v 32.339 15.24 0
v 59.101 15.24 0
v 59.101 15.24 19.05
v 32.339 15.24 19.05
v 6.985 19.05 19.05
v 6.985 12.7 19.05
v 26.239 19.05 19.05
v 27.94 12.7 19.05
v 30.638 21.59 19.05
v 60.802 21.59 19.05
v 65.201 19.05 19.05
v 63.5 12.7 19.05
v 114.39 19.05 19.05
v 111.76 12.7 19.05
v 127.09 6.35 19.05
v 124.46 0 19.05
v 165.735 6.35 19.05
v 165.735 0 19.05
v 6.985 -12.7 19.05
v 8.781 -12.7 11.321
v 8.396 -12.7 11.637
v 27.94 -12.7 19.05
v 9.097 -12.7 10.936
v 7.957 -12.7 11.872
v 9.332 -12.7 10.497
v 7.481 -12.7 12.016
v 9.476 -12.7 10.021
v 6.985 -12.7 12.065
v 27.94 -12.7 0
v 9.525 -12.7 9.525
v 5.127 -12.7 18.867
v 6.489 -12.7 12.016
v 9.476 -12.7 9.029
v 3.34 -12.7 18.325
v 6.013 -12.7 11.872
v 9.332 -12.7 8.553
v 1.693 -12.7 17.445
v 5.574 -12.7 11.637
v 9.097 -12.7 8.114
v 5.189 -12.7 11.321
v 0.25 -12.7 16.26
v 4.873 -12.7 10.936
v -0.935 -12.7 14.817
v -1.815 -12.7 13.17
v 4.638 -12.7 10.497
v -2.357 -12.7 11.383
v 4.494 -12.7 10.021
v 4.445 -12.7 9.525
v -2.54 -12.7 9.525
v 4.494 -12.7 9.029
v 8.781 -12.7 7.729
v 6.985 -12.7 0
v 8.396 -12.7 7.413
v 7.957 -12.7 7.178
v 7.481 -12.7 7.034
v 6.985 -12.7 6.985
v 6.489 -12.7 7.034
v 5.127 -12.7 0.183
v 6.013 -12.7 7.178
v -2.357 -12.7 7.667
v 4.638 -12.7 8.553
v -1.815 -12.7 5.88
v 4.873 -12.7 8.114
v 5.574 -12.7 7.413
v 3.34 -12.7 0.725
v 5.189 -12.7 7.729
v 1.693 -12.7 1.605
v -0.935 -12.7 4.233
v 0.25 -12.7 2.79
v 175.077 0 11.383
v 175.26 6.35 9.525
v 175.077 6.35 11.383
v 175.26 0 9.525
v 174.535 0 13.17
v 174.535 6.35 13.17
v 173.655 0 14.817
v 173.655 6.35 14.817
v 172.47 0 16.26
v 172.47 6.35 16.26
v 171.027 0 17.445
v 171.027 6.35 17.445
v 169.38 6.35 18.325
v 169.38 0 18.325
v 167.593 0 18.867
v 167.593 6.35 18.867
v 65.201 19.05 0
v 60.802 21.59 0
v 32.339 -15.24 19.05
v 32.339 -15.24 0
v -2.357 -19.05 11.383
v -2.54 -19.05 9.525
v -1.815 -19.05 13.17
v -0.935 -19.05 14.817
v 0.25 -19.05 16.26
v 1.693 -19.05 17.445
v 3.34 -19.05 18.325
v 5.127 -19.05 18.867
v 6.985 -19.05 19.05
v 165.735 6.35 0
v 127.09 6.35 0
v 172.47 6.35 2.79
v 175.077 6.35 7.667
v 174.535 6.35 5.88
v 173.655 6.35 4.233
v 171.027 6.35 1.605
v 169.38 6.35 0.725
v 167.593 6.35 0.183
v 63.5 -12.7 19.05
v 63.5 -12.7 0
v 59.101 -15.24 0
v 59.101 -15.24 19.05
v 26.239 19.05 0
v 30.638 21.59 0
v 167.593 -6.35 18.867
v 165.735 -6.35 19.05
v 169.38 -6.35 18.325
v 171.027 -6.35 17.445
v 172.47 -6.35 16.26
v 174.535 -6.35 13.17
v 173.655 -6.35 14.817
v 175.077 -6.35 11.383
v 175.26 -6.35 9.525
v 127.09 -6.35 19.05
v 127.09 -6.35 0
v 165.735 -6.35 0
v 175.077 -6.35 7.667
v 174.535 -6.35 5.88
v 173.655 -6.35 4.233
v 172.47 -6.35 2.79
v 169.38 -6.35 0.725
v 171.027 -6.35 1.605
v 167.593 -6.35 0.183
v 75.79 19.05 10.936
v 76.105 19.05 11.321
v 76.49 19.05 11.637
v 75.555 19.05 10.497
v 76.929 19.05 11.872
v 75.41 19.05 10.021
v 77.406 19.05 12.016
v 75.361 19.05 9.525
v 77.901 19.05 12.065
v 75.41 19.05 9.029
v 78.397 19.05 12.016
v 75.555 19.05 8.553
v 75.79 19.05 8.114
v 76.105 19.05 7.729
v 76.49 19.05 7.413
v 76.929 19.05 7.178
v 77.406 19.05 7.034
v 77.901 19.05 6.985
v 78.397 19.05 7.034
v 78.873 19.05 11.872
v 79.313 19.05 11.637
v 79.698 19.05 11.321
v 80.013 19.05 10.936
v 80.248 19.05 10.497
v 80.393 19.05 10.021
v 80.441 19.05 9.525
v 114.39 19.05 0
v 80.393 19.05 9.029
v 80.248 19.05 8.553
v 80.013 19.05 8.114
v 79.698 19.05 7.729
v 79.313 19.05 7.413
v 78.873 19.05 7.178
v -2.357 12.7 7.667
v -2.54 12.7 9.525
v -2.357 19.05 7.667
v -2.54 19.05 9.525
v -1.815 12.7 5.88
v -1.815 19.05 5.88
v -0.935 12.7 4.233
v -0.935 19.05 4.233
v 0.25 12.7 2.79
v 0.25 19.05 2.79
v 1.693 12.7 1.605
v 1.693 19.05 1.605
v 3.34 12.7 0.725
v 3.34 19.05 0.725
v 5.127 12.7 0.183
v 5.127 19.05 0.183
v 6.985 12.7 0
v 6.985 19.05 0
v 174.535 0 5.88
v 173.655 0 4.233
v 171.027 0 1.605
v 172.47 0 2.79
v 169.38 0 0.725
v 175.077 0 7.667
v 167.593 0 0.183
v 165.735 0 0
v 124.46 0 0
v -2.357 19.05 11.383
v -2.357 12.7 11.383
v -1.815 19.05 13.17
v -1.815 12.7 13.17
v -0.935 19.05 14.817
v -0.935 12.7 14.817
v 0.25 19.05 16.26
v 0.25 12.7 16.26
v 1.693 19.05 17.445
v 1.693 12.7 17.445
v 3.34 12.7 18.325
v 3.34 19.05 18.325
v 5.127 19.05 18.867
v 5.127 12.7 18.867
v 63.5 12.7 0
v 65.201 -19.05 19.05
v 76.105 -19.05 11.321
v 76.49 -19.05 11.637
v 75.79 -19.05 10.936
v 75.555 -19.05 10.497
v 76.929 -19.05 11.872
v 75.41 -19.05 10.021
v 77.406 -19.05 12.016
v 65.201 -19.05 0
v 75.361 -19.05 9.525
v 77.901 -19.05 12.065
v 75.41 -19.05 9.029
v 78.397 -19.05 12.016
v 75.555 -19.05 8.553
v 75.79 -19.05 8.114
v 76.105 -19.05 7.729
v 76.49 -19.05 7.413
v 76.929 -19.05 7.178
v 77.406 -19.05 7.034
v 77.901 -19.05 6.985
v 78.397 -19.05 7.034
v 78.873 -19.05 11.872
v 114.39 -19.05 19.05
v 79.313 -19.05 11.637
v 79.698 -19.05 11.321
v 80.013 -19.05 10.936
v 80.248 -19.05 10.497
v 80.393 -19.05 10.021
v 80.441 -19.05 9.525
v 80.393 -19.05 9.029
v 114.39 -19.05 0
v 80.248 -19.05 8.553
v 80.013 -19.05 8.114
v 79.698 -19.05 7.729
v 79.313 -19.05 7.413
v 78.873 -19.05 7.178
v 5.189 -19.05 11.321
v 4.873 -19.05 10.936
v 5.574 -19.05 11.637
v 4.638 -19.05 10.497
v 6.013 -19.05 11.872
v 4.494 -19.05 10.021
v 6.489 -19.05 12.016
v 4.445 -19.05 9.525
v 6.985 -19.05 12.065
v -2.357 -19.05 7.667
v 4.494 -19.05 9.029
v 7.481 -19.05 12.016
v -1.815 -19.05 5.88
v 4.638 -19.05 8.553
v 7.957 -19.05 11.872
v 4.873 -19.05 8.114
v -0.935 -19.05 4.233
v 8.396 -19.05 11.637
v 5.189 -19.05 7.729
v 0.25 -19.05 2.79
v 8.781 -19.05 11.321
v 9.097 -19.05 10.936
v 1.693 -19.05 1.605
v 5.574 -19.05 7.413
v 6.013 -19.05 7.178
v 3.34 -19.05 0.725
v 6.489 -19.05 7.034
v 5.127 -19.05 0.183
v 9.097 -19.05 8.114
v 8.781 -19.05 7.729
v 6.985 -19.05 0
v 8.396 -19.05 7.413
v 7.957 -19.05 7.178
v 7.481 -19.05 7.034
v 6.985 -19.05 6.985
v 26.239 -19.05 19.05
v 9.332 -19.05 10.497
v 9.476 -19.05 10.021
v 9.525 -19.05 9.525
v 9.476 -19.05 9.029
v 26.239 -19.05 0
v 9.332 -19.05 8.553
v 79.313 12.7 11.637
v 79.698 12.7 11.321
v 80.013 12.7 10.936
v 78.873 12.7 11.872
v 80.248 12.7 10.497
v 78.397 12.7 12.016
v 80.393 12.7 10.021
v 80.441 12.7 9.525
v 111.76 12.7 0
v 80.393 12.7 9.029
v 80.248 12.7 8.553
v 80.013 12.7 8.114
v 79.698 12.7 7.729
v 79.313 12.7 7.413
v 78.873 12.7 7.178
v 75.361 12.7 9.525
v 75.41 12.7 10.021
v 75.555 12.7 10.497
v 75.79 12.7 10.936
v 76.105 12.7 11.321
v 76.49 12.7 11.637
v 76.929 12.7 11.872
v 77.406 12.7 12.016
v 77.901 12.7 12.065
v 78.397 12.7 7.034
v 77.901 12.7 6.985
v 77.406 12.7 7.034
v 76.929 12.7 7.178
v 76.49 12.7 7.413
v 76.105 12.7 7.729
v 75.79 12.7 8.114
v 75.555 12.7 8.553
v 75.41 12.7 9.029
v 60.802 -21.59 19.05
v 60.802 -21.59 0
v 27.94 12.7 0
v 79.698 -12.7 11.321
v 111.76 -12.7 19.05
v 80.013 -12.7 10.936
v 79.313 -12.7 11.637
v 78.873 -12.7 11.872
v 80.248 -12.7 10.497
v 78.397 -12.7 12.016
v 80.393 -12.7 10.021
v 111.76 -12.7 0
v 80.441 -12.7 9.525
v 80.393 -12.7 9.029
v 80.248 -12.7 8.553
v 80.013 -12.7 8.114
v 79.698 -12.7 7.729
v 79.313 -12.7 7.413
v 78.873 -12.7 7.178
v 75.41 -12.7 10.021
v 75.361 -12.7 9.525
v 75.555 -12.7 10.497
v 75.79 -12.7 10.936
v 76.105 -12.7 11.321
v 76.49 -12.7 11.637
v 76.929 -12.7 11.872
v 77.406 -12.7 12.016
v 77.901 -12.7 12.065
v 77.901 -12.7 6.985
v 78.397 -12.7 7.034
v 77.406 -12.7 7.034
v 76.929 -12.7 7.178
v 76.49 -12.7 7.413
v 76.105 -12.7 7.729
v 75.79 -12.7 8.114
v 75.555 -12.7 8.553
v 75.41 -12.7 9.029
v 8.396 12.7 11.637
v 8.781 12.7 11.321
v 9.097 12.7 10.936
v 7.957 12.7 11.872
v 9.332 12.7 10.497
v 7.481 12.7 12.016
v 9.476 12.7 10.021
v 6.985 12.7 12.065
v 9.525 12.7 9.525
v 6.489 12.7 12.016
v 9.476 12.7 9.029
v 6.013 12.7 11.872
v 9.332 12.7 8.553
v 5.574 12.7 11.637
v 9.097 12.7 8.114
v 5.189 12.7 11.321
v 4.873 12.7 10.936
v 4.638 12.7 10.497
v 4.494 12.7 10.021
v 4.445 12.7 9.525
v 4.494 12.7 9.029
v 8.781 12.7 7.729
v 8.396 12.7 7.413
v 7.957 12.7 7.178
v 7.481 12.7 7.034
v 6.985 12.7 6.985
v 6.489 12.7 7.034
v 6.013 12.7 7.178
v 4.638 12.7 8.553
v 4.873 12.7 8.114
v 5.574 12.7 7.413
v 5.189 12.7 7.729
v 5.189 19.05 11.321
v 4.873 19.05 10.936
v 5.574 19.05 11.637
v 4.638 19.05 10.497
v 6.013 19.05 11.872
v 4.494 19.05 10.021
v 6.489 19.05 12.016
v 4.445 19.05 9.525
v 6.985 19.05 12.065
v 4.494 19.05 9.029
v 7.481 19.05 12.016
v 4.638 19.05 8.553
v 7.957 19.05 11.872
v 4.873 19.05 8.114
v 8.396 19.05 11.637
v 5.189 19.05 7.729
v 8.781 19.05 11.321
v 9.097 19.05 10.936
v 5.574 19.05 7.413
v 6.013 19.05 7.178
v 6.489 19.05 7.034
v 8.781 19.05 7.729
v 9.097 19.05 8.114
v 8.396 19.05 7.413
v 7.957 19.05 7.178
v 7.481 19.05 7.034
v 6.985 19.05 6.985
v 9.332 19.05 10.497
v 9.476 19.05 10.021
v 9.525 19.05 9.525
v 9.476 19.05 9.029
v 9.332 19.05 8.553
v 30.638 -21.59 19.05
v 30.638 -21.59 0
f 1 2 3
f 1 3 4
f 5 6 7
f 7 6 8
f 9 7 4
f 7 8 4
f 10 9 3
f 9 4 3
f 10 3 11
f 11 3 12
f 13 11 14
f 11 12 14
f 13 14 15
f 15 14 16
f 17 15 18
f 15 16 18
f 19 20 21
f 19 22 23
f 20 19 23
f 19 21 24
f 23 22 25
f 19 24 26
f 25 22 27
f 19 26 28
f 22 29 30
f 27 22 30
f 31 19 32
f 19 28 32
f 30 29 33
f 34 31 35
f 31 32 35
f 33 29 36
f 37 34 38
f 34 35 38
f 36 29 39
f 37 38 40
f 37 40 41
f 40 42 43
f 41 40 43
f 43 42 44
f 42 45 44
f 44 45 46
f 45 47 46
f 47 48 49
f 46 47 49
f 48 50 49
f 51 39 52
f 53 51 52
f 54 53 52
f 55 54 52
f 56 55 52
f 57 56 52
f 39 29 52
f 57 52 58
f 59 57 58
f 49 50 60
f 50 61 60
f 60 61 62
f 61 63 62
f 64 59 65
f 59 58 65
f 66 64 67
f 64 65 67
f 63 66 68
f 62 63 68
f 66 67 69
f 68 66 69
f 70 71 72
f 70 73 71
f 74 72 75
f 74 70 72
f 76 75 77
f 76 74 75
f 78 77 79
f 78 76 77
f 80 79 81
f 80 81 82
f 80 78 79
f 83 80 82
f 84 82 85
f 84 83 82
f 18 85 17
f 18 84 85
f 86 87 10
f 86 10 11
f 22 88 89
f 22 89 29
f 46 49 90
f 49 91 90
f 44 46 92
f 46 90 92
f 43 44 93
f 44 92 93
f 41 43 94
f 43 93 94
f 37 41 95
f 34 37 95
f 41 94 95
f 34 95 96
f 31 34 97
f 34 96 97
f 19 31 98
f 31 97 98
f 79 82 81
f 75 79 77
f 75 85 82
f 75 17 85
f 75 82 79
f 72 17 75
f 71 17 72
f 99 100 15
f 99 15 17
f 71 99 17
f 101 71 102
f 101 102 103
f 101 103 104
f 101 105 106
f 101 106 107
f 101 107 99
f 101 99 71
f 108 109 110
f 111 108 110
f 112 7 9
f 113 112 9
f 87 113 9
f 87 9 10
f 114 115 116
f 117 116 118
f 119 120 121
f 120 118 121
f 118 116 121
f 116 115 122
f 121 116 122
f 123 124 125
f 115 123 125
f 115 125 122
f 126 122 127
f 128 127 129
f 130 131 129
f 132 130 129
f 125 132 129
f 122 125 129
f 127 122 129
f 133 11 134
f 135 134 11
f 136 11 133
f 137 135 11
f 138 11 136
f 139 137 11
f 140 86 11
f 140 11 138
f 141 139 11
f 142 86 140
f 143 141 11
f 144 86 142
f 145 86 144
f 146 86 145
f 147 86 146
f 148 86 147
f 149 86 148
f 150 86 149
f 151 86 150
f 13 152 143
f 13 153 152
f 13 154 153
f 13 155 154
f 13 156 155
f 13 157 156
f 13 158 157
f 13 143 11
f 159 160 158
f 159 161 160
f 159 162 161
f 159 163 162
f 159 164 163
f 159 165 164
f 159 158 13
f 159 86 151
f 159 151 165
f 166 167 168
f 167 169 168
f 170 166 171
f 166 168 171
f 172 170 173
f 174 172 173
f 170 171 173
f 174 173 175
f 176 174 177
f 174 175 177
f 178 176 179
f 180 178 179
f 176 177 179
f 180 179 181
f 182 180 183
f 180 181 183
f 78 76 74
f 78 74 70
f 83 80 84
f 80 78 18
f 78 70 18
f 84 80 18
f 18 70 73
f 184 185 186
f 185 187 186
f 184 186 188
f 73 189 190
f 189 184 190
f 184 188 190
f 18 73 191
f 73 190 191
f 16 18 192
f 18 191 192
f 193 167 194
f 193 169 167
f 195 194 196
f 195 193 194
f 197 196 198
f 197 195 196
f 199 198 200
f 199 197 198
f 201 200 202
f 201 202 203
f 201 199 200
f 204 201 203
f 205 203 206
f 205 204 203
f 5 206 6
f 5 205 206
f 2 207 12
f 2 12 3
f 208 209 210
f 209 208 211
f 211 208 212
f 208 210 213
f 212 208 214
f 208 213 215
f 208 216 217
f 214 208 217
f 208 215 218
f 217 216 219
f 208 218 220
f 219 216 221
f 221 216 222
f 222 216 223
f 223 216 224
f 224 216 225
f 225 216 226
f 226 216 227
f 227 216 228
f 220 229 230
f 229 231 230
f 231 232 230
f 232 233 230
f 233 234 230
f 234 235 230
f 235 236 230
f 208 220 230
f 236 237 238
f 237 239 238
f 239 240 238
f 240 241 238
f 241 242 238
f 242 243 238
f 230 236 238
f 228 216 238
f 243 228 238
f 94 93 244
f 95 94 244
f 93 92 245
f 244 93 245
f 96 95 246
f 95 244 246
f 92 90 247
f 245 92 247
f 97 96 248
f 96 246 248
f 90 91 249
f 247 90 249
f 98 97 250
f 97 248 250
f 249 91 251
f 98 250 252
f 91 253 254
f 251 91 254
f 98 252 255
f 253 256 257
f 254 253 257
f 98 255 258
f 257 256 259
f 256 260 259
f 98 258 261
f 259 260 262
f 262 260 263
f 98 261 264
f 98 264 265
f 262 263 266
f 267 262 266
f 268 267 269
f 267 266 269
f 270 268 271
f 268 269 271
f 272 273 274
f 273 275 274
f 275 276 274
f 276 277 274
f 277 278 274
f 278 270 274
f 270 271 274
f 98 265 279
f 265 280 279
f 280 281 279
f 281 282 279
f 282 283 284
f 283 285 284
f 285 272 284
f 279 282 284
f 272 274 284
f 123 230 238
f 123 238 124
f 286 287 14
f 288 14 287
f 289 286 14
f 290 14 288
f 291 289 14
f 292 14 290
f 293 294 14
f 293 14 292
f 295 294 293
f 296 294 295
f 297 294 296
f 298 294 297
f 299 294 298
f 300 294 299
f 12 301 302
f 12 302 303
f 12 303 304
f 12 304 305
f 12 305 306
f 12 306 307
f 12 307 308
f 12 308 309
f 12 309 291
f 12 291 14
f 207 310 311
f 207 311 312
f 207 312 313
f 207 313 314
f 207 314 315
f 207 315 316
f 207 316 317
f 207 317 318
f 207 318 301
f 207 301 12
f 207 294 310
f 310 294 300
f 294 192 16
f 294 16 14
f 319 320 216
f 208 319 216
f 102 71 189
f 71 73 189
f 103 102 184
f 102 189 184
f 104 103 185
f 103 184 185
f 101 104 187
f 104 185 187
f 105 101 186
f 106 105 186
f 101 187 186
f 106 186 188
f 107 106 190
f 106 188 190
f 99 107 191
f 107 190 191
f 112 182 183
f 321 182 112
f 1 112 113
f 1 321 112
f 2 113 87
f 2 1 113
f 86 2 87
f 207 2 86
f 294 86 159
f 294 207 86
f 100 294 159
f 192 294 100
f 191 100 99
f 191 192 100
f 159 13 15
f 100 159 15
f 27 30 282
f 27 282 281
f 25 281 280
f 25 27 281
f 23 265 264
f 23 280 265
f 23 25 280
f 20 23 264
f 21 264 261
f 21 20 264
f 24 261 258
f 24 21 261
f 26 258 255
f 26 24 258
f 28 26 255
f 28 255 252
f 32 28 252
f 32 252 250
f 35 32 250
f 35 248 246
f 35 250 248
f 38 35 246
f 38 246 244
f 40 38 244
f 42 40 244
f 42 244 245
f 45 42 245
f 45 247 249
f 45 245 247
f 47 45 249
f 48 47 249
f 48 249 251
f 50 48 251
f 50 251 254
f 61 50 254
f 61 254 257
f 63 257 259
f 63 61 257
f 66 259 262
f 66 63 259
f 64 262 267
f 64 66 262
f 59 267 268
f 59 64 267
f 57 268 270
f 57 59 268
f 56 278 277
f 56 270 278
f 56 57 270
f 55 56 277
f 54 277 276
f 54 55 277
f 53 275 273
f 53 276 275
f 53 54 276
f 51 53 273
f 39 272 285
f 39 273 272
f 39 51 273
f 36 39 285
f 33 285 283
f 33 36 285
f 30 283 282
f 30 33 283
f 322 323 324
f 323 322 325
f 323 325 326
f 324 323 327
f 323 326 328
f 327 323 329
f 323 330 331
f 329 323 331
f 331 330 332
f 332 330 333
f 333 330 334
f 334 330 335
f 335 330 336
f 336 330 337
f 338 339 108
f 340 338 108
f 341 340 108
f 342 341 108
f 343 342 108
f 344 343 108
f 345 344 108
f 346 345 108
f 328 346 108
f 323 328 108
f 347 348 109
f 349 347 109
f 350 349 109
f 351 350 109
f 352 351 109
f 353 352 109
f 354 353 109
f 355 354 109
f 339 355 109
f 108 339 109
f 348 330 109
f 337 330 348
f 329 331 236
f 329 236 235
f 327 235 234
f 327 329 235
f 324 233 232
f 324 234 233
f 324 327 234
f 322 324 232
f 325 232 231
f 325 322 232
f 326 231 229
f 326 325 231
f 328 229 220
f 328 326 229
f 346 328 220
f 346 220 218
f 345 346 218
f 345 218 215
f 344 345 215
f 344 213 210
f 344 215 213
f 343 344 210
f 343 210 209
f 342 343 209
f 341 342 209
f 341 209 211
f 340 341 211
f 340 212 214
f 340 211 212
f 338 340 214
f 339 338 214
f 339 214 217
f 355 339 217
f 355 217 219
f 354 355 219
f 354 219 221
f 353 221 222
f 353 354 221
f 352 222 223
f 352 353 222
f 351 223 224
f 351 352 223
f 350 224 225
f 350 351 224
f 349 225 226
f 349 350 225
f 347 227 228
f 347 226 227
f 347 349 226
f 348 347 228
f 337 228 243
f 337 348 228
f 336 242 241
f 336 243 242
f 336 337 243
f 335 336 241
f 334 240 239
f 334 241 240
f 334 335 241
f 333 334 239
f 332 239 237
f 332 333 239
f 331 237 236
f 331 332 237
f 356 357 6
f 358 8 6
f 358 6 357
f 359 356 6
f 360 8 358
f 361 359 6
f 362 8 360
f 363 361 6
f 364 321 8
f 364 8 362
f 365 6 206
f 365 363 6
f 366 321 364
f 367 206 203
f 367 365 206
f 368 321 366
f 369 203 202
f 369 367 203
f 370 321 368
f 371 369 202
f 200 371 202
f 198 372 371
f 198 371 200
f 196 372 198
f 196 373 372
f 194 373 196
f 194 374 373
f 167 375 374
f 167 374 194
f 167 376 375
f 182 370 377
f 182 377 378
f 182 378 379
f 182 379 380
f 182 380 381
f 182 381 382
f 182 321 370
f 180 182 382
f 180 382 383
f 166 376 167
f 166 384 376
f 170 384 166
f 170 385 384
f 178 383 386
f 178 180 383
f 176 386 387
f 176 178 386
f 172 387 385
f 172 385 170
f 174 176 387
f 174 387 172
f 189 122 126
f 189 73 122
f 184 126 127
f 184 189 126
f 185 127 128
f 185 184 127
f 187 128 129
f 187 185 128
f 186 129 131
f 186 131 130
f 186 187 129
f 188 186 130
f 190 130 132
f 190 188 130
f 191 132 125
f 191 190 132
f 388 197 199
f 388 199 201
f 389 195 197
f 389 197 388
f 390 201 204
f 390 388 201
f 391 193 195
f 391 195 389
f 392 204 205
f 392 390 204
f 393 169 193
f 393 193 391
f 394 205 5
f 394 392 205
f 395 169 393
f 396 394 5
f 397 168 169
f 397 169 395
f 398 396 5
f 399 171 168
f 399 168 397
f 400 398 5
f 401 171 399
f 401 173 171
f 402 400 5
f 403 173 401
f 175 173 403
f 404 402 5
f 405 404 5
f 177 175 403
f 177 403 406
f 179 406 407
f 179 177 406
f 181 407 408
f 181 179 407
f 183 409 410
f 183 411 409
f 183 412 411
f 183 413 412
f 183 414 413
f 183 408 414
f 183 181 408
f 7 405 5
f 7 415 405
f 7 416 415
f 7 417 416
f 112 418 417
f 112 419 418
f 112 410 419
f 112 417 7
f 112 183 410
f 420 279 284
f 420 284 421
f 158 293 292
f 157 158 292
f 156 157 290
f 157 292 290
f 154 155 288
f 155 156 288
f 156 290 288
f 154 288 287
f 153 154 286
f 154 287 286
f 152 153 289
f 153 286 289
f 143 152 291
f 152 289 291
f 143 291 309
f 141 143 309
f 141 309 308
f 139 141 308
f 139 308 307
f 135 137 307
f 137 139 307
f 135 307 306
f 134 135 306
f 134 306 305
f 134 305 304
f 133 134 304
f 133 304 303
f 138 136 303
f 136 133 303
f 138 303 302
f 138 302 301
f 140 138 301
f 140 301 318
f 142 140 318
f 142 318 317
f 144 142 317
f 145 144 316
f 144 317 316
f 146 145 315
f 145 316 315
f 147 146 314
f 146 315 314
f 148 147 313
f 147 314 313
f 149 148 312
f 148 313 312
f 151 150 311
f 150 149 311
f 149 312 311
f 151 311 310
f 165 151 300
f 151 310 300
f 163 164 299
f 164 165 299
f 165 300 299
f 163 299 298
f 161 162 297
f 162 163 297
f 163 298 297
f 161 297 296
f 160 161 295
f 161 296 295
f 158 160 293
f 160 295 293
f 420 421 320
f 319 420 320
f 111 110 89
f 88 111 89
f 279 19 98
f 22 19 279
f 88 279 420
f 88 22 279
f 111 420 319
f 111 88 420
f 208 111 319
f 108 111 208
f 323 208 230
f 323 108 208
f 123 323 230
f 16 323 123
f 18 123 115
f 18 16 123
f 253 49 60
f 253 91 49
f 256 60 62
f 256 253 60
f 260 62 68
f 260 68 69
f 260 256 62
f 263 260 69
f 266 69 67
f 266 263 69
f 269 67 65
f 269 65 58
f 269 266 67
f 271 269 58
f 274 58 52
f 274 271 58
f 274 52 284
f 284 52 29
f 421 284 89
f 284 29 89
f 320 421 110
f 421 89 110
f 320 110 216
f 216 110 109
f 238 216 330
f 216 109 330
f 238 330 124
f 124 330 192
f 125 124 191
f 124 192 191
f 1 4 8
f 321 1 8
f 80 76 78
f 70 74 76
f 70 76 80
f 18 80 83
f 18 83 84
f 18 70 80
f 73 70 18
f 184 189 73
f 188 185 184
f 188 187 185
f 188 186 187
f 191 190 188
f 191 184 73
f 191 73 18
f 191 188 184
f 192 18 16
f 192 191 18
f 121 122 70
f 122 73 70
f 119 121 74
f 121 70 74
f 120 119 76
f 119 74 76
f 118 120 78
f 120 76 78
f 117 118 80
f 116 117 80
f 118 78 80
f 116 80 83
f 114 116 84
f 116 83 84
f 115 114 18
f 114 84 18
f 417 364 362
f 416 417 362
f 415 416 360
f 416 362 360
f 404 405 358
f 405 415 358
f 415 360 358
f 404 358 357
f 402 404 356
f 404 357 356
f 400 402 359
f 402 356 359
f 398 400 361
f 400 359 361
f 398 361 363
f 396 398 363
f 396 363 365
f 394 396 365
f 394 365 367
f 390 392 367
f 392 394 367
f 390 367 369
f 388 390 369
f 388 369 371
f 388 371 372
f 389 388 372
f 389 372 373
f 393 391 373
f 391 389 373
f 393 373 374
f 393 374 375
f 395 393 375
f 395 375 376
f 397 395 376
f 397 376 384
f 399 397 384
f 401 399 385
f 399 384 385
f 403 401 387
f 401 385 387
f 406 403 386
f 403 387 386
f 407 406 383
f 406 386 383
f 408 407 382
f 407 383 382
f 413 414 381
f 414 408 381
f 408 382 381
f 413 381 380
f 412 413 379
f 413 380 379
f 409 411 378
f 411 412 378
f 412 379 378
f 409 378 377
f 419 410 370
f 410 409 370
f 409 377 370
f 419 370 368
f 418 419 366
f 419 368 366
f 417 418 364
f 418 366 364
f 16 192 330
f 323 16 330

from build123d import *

# Parameters (mm, degrees)
F1_DEPTH = 19.05
F2_R     = 9.52499
F3_R     = 2.54
F4_DEPTH = 25.4


# Not quite as in the source:
# - a fillet or chamfer is up to 0.001 mm smaller than in the source, because OpenCascade refuses the exact size


with BuildPart() as f1:
    # F0 (on Top) → F1 (new body)
    with BuildSketch(Plane.XY):
        Polygon((27.94, -12.7), (-2.54, -12.7), (-2.54, -19.05), (26.2385226281, -19.05), (30.6379316793, -21.59), (60.8020683207, -21.59), (65.2014773719, -19.05), (114.3902561211, -19.05), (127.0902561211, -6.35), (175.26, -6.35), (175.26, 0), (124.46, 0), (111.76, -12.7), (63.5, -12.7), (59.1005909488, -15.24), (32.3394090512, -15.24), align=None)
    extrude(amount=F1_DEPTH)

    # F2 (radius 9.525 in the source; OpenCascade refuses exactly that, so slightly less here)
    f2_edges = [f1.edges().sort_by_distance(p)[0] for p in [
        (-2.54, -15.875, 19.05),
        (-2.54, -15.875, 0),
        (175.26, -3.175, 19.05),
        (175.26, -3.175, 0),
    ]]
    fillet(f2_edges, radius=F2_R)

    # F3 (on Front) → F4 (cut)
    with BuildSketch(Plane.XZ):
        with Locations((6.985, 9.525)):
            Circle(F3_R)
        with Locations((77.9014773719, 9.525)):
            Circle(F3_R)
    extrude(amount=F4_DEPTH, mode=Mode.SUBTRACT)


with BuildPart() as f5_1:
    # F5: instance of F1
    add(f1.part.mirror(Plane.XZ))


solid = Compound([f1.part, f5_1.part])
